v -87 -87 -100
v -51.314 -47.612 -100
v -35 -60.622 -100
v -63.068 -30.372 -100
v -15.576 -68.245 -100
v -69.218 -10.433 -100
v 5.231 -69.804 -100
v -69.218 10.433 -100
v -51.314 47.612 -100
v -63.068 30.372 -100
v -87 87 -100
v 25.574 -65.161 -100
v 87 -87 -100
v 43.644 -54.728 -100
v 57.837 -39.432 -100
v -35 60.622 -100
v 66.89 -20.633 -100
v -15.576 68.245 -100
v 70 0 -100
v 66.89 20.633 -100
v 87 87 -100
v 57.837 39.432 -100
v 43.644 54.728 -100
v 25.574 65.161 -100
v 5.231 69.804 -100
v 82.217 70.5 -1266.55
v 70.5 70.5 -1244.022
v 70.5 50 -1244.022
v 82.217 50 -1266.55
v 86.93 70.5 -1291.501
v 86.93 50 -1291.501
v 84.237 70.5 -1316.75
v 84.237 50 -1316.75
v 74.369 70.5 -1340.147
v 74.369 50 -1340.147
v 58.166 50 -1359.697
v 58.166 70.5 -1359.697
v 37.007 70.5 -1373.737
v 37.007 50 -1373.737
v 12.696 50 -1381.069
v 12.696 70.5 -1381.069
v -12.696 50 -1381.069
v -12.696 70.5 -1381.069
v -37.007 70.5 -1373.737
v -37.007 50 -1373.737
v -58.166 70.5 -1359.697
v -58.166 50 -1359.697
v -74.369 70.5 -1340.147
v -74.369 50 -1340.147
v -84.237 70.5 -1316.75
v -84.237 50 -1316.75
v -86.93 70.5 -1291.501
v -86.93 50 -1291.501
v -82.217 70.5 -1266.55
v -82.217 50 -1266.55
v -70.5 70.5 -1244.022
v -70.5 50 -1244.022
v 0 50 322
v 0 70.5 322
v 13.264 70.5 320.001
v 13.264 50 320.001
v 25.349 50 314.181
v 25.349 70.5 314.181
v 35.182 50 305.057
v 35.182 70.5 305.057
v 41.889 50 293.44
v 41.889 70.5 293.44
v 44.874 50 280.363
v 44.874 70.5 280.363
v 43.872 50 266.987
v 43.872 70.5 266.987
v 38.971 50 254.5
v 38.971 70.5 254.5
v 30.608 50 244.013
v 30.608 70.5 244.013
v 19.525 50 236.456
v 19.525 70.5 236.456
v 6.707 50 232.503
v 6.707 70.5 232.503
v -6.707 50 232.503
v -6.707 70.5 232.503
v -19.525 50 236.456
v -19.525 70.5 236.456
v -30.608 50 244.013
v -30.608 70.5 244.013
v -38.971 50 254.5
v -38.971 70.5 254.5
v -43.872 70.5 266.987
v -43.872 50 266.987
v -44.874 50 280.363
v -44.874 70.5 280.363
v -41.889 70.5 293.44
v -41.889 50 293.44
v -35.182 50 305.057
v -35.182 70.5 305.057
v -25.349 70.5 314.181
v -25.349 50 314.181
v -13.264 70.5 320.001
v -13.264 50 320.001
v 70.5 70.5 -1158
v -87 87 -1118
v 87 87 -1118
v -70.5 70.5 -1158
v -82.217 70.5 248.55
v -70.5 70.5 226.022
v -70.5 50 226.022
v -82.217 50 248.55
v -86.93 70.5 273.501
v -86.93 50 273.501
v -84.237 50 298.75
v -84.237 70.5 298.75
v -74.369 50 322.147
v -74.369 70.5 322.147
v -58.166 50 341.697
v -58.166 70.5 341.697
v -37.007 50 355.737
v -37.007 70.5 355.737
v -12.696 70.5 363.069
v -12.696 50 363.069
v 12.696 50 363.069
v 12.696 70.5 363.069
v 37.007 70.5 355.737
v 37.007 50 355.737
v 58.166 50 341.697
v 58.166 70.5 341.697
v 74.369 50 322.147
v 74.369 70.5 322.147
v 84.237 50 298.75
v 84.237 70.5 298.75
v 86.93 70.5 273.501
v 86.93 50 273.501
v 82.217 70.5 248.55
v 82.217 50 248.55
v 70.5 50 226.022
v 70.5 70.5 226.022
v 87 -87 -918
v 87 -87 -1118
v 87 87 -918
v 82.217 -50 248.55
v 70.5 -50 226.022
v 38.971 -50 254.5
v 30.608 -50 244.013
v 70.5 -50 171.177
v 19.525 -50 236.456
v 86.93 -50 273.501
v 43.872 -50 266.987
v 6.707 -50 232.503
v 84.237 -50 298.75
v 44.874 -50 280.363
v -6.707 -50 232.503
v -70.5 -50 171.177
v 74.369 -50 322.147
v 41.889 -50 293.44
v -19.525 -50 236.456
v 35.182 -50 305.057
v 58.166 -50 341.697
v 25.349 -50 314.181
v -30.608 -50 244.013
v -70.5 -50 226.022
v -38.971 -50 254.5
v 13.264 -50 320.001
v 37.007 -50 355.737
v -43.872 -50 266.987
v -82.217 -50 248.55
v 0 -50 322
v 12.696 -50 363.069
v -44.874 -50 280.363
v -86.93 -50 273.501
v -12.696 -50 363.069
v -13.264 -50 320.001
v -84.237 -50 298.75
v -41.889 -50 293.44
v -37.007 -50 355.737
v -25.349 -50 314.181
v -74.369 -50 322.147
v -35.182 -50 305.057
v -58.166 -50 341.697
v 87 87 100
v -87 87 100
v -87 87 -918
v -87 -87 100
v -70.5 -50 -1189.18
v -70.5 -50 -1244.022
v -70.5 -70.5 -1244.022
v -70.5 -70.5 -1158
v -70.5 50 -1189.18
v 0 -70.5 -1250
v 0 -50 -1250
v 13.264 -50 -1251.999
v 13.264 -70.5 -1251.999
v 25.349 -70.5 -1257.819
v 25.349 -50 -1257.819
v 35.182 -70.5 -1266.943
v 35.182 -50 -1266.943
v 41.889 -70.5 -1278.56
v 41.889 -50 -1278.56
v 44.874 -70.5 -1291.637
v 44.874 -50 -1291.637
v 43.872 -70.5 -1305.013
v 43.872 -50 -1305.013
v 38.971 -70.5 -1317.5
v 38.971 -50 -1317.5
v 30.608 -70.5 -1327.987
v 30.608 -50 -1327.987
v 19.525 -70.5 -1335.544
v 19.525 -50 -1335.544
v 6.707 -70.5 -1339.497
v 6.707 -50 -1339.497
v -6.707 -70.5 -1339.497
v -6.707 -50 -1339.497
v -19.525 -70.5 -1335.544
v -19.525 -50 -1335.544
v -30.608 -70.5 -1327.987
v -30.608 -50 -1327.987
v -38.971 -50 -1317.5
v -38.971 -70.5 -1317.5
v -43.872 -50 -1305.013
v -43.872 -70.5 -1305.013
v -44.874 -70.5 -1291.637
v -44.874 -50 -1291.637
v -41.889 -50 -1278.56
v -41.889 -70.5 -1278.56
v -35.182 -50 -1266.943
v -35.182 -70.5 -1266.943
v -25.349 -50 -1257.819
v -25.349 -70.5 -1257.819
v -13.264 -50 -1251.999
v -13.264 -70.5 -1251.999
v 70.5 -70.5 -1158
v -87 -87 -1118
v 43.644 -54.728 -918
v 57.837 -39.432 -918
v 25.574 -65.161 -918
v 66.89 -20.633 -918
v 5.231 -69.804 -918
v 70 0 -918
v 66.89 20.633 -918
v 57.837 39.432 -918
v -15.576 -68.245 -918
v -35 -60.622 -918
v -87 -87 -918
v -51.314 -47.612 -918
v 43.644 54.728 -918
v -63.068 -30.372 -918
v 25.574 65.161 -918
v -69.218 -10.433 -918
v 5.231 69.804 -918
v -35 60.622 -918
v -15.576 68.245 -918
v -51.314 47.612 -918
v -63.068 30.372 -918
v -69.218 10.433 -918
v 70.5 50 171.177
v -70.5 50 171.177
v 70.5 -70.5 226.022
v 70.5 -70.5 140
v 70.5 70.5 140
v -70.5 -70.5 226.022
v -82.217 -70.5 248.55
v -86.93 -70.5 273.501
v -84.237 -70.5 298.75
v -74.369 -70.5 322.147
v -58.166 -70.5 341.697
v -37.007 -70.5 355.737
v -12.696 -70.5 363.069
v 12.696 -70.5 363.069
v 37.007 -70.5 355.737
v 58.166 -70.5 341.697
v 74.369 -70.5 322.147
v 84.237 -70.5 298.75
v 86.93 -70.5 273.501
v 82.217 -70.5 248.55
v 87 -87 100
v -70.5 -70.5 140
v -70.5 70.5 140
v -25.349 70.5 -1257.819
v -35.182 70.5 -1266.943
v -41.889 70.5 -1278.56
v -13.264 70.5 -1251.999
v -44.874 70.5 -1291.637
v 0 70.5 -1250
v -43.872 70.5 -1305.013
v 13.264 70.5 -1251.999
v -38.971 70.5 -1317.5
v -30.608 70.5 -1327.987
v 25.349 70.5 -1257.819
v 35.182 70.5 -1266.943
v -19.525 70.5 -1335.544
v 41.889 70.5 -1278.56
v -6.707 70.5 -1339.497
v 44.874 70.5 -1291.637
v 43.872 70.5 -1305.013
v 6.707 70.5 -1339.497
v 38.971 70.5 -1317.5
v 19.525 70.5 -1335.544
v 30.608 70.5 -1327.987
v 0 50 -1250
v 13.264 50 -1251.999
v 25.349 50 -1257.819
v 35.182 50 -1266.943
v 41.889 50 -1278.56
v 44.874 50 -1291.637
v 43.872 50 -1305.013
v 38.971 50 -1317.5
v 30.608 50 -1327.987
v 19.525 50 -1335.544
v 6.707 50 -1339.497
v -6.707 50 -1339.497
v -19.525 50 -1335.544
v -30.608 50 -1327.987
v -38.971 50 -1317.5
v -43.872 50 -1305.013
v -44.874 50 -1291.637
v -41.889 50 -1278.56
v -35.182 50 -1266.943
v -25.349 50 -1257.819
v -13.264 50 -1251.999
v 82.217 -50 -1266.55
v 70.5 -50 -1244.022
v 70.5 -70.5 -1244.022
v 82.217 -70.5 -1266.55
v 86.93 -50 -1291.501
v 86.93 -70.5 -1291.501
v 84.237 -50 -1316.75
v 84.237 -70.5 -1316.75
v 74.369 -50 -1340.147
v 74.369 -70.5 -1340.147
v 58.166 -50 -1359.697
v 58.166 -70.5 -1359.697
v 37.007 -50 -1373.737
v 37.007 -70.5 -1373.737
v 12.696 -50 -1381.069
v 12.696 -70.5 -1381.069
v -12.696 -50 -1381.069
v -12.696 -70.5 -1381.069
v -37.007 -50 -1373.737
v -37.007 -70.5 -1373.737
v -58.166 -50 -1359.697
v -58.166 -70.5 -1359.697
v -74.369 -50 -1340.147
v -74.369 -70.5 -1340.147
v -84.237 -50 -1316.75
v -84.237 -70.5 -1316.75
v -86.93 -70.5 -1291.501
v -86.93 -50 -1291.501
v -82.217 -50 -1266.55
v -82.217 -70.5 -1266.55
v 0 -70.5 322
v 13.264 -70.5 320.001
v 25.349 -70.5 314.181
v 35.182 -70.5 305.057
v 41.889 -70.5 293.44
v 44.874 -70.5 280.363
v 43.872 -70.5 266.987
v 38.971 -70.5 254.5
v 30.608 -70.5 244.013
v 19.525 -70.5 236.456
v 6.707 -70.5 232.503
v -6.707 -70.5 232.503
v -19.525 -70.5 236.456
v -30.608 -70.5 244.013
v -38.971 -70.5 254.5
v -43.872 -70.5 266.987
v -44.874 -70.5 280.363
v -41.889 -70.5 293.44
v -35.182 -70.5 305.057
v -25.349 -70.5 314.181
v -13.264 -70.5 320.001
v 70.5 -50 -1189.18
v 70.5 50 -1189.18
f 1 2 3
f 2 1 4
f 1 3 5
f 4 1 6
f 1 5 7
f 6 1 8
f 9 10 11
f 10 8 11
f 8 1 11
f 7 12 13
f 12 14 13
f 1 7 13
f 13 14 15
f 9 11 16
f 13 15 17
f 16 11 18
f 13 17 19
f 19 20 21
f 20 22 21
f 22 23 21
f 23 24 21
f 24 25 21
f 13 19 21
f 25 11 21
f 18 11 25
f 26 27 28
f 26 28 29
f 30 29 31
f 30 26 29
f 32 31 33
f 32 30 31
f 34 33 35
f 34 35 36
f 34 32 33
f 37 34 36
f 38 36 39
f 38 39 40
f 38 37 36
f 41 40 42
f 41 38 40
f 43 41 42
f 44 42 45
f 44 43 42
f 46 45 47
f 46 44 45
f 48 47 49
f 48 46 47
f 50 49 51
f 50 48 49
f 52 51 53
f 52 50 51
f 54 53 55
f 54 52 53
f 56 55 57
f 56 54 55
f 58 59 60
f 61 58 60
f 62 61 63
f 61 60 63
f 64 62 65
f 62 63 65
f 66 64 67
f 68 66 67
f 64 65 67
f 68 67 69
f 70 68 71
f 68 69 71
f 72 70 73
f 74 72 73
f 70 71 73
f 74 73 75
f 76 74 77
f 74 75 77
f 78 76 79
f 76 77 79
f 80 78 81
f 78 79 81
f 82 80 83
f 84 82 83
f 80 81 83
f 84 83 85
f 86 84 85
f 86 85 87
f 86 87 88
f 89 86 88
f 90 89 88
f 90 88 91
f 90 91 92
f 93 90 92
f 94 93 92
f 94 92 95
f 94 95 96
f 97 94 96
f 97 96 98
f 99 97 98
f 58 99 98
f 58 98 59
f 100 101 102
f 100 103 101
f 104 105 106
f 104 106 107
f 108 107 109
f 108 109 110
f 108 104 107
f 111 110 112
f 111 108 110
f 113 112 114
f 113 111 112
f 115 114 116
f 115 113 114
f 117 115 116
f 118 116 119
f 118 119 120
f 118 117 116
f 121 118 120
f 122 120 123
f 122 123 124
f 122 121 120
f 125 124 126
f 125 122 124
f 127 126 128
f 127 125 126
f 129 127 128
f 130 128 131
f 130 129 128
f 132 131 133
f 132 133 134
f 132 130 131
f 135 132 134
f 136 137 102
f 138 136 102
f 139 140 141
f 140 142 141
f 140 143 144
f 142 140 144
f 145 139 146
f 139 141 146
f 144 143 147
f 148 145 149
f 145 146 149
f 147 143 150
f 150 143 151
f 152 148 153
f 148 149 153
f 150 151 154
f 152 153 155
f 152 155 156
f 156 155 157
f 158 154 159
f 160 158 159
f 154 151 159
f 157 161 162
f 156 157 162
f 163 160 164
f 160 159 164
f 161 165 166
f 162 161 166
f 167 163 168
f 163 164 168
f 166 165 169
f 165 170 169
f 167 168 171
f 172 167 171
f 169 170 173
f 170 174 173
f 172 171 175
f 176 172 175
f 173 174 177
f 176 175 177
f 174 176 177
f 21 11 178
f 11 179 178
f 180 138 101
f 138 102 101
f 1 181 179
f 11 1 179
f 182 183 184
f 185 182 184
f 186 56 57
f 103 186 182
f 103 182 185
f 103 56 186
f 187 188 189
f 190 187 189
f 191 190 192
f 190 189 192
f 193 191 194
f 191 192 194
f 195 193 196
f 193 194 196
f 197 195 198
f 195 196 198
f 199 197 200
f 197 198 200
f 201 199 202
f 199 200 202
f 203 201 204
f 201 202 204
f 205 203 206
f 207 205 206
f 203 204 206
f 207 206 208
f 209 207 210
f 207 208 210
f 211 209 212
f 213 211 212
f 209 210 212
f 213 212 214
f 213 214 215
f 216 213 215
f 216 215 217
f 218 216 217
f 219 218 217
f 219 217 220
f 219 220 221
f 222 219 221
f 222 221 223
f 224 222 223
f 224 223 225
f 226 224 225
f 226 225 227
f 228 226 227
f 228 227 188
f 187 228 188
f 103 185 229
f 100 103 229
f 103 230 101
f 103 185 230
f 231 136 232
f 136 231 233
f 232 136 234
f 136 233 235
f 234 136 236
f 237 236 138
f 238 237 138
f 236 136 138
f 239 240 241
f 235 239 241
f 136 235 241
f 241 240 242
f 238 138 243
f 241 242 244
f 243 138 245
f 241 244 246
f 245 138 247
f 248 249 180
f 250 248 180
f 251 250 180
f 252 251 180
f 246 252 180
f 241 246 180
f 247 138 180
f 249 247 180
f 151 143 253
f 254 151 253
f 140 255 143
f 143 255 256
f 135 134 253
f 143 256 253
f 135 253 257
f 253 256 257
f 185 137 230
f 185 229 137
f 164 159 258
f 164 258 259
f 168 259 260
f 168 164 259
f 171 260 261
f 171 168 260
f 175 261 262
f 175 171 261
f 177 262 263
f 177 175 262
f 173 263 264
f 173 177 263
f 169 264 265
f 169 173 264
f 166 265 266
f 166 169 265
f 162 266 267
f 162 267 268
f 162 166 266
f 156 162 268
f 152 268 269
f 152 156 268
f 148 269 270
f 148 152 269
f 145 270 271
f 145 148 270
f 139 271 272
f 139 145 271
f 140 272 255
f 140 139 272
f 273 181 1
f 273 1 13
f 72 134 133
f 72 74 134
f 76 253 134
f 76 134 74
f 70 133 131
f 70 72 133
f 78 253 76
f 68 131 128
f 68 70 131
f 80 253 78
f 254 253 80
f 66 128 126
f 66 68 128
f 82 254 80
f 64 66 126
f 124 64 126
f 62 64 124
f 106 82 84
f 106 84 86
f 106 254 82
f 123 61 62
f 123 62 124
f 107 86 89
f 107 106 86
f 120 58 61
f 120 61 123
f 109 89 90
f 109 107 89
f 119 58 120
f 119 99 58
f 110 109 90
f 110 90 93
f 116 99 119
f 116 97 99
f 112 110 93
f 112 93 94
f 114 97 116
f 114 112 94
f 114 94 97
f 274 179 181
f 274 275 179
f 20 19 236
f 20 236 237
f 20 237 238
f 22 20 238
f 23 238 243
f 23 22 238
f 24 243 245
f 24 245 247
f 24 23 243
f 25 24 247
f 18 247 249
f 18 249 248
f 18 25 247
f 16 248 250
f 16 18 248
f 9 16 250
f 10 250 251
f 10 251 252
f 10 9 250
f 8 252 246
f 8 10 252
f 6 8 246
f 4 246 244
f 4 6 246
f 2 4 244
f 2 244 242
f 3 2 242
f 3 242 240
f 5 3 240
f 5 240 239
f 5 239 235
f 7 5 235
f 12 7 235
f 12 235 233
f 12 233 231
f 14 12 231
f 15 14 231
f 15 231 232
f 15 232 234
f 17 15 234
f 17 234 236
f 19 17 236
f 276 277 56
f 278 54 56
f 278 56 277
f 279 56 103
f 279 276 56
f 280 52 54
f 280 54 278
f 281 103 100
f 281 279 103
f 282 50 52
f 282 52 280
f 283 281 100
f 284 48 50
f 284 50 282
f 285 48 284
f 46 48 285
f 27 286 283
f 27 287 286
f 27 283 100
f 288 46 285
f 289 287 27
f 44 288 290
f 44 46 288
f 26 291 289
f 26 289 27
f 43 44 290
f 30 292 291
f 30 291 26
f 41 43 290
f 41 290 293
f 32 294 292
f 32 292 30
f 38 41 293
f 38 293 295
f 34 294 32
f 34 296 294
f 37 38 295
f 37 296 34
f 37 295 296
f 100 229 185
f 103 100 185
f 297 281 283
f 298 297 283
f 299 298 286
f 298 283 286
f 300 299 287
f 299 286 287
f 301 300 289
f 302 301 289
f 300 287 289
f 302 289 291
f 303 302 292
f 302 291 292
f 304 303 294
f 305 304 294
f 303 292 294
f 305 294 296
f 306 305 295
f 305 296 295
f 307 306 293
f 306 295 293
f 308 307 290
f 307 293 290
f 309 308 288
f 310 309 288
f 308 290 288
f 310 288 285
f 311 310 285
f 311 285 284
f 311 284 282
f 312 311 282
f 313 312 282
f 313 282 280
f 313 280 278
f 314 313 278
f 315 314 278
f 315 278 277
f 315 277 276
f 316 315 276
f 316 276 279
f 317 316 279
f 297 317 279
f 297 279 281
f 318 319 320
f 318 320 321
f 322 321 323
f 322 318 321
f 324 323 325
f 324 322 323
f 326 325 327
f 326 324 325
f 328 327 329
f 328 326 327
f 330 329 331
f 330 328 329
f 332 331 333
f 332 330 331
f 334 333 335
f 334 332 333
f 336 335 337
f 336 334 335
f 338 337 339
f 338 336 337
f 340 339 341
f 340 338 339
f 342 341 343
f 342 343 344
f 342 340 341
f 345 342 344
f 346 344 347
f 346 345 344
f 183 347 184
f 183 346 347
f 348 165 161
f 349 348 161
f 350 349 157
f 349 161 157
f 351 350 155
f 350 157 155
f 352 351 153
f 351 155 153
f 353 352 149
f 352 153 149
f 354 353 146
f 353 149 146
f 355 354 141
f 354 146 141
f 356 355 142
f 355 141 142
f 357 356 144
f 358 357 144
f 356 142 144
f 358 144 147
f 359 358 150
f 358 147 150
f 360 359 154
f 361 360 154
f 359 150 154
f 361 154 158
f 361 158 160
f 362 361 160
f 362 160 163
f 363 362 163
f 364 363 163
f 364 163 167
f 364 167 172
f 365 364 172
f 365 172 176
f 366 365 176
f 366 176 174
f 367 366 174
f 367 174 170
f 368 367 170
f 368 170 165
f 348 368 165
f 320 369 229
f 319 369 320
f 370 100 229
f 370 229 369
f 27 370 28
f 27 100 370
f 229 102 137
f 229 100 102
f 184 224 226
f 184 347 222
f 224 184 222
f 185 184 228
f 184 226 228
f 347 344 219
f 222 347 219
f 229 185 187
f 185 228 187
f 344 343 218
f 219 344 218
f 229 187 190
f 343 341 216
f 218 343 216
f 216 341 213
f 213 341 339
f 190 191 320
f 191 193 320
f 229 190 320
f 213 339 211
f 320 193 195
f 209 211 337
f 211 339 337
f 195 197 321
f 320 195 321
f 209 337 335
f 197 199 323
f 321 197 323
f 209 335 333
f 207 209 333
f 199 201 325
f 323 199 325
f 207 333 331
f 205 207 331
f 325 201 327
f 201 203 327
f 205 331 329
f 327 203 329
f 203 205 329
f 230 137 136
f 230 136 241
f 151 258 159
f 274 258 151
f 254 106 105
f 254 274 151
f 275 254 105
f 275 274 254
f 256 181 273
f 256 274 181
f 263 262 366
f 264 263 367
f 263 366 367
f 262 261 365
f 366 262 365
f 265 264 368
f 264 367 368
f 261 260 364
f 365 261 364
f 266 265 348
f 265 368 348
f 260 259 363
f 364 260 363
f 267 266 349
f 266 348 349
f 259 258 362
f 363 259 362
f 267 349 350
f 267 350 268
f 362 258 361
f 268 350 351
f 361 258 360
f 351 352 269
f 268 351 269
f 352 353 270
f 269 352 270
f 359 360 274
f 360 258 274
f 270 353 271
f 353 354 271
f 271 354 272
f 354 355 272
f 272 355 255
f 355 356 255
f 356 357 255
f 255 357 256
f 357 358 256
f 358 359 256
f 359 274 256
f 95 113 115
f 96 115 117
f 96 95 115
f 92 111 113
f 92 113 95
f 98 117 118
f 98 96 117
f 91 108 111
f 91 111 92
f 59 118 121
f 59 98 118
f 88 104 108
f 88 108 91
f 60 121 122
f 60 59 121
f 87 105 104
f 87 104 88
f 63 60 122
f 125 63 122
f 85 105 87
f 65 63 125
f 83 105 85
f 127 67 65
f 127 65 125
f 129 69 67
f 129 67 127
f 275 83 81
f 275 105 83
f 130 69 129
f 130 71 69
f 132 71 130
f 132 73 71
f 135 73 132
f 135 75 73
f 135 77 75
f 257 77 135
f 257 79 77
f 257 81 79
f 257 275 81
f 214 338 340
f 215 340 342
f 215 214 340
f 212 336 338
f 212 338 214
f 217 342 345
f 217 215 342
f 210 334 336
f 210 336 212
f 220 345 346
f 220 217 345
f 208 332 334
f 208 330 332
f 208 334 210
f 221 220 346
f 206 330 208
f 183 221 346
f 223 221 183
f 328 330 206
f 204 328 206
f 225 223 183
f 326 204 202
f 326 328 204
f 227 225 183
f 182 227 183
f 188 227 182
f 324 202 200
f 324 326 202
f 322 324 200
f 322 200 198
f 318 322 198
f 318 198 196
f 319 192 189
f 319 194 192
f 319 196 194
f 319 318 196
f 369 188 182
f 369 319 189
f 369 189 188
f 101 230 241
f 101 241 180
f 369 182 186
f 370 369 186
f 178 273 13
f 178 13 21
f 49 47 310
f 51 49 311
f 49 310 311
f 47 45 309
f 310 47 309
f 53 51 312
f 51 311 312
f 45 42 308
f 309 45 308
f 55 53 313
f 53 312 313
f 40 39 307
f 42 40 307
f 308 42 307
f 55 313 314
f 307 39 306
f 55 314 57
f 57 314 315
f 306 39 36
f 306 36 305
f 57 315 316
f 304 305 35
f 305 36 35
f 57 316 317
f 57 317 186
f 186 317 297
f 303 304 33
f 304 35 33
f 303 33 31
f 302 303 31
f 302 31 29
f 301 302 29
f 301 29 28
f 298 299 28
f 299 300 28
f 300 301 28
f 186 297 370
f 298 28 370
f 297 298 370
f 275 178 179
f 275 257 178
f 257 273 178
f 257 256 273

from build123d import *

# Parameters (mm, degrees)
SKETCH2_R                = 70
BOSS_EXTRUDE2_DEPTH      = 1018
SKETCH4_W                = 174
SKETCH4_H                = 174
BOSS_EXTRUDE3_DEPTH      = 100
SKETCH7_W                = 174
SKETCH7_H                = 174
BOSS_EXTRUDE4_DEPTH      = 100
SKETCH14_R               = 87
BOSS_EXTRUDE5_DEPTH      = 141
SKETCH16_R               = 45
CUT_EXTRUDE1_DEPTH       = 141
BOSS_EXTRUDE6_REACH      = 1305.818
BOSS_EXTRUDE6_END_RADIUS = 87
SKETCH17_W               = 141
SKETCH17_H               = 141
SKETCH23_W               = 196.221845396
SKETCH23_H               = 100
CUT_EXTRUDE2_DEPTH       = 201
BOSS_EXTRUDE7_DEPTH      = 70.5
SKETCH26_R               = 45
CUT_EXTRUDE3_DEPTH       = 141
CUT_EXTRUDE4_START       = -187.5
SKETCH28_W               = 279.509799424
SKETCH28_H               = 100
CUT_EXTRUDE4_DEPTH       = 174


with BuildPart() as part:
    # Sketch2 → Boss-Extrude2 (new body)
    with BuildSketch(Plane.XY):
        Circle(SKETCH2_R)
    extrude(amount=-BOSS_EXTRUDE2_DEPTH)

    # Sketch4 → Boss-Extrude3 (add, symmetric)
    with BuildSketch(Plane.XY):
        Rectangle(SKETCH4_W, SKETCH4_H)
    extrude(amount=BOSS_EXTRUDE3_DEPTH, both=True)

    # Sketch7 → Boss-Extrude4 (add, symmetric)
    with BuildSketch(Plane(origin=(0, 0, -1018), x_dir=(-1, 0, 0), z_dir=(0, 0, -1))):
        Rectangle(SKETCH7_W, SKETCH7_H)
    extrude(amount=BOSS_EXTRUDE4_DEPTH, both=True)

    # Sketch8 → section 1 of loft1
    with BuildSketch(Plane.XY.offset(140), mode=Mode.PRIVATE) as loft1_s1:
        with BuildLine():
            Line((-70.5, 70.5), (70.5, 70.5))
            Line((70.5, 70.5), (70.5, -70.5))
            Line((70.5, -70.5), (-70.5, -70.5))
            Line((-70.5, -70.5), (-70.5, 70.5))
        make_face()
    # loft from a face of the part (loft1)
    loft([part.faces().sort_by_distance((0, 0, 100))[0], loft1_s1.sketch])

    # Sketch10 → section 1 of loft8
    with BuildSketch(Plane(origin=(0, 0, -1158), x_dir=(-1, 0, 0), z_dir=(0, 0, -1)), mode=Mode.PRIVATE) as loft8_s1:
        with BuildLine():
            Line((-70.5, 70.5), (70.5, 70.5))
            Line((70.5, 70.5), (70.5, -70.5))
            Line((70.5, -70.5), (-70.5, -70.5))
            Line((-70.5, -70.5), (-70.5, 70.5))
        make_face()
    # loft from a face of the part (loft8)
    loft([part.faces().sort_by_distance((0, 0, -1118))[0], loft8_s1.sketch])



with BuildPart() as body_2:
    # Sketch14 → Boss-Extrude5 (new body)
    with BuildSketch(Plane(origin=(0, 70.5, 0), x_dir=(-1, 0, 0), z_dir=(0, 1, 0))):
        with Locations(Location((0, 277, 0), (0, 0, 90))):
            Circle(SKETCH14_R)
    extrude(amount=-BOSS_EXTRUDE5_DEPTH)

    # Sketch16 → Cut-Extrude1 (cut)
    with BuildSketch(Plane(origin=(0, 70.5, 0), x_dir=(1, 0, 0), z_dir=(0, 1, 0))):
        with Locations(Location((0, -277, 0), (0, 0, 270))):
            Circle(SKETCH16_R)
    extrude(amount=-CUT_EXTRUDE1_DEPTH, mode=Mode.SUBTRACT)


with BuildPart() as part_1:
    add(part.part)

    add(body_2.part)  # Boss-Extrude6 merges body 2
    # Boss-Extrude6: up to this cylinder (the profile starts outside it)
    boss_extrude6_end = Plane(origin=(0, 0, 277), z_dir=(0, 1, 0)) * Cylinder(BOSS_EXTRUDE6_END_RADIUS, 2786.636, mode=Mode.PRIVATE)
    # Sketch17 → Boss-Extrude6 (add, up to the surface)
    with BuildSketch(Plane.XY.offset(140), mode=Mode.PRIVATE) as boss_extrude6_sk1:
        Rectangle(SKETCH17_W, SKETCH17_H)
    boss_extrude6_tool1 = extrude(boss_extrude6_sk1.sketch, amount=BOSS_EXTRUDE6_REACH, mode=Mode.PRIVATE) - boss_extrude6_end
    add(boss_extrude6_tool1.solids().sort_by_distance((0, 0, 140))[0])

    # Sketch23 → Cut-Extrude2 (cut)
    with BuildSketch(Plane.ZY.offset(94.5)):
        with Locations((269.287462291, 0)):
            Rectangle(SKETCH23_W, SKETCH23_H)
    extrude(amount=-CUT_EXTRUDE2_DEPTH, mode=Mode.SUBTRACT)


with BuildPart() as body_2_2:
    # Sketch24 → Boss-Extrude7 (new, symmetric)
    with BuildSketch(Plane(origin=(0, 0, 0), x_dir=(1, 0, 0), z_dir=(0, 1, 0))):
        with BuildLine():
            Line((-70.5, 1158), (70.5, 1158))
            Line((70.5, 1158), (70.5, 1244.022063596))
            ThreePointArc((70.5, 1244.022063596), (0, 1382), (-70.5, 1244.022063596))
            Line((-70.5, 1244.022063596), (-70.5, 1158))
        make_face()
    extrude(amount=BOSS_EXTRUDE7_DEPTH, both=True)

    # Sketch26 → Cut-Extrude3 (cut)
    with BuildSketch(Plane(origin=(0, 70.5, 0), x_dir=(1, 0, 0), z_dir=(0, 1, 0))):
        with Locations(Location((0, 1295, 0), (0, 0, 270))):
            Circle(SKETCH26_R)
    extrude(amount=-CUT_EXTRUDE3_DEPTH, mode=Mode.SUBTRACT)

    # Sketch28 → Cut-Extrude4 (cut)
    with BuildSketch(Plane.ZY.offset(100.5).offset(CUT_EXTRUDE4_START)):
        with Locations((-1328.934899712, 0)):
            Rectangle(SKETCH28_W, SKETCH28_H)
    extrude(amount=CUT_EXTRUDE4_DEPTH, mode=Mode.SUBTRACT)


solid = Compound([part_1.part, body_2_2.part])
